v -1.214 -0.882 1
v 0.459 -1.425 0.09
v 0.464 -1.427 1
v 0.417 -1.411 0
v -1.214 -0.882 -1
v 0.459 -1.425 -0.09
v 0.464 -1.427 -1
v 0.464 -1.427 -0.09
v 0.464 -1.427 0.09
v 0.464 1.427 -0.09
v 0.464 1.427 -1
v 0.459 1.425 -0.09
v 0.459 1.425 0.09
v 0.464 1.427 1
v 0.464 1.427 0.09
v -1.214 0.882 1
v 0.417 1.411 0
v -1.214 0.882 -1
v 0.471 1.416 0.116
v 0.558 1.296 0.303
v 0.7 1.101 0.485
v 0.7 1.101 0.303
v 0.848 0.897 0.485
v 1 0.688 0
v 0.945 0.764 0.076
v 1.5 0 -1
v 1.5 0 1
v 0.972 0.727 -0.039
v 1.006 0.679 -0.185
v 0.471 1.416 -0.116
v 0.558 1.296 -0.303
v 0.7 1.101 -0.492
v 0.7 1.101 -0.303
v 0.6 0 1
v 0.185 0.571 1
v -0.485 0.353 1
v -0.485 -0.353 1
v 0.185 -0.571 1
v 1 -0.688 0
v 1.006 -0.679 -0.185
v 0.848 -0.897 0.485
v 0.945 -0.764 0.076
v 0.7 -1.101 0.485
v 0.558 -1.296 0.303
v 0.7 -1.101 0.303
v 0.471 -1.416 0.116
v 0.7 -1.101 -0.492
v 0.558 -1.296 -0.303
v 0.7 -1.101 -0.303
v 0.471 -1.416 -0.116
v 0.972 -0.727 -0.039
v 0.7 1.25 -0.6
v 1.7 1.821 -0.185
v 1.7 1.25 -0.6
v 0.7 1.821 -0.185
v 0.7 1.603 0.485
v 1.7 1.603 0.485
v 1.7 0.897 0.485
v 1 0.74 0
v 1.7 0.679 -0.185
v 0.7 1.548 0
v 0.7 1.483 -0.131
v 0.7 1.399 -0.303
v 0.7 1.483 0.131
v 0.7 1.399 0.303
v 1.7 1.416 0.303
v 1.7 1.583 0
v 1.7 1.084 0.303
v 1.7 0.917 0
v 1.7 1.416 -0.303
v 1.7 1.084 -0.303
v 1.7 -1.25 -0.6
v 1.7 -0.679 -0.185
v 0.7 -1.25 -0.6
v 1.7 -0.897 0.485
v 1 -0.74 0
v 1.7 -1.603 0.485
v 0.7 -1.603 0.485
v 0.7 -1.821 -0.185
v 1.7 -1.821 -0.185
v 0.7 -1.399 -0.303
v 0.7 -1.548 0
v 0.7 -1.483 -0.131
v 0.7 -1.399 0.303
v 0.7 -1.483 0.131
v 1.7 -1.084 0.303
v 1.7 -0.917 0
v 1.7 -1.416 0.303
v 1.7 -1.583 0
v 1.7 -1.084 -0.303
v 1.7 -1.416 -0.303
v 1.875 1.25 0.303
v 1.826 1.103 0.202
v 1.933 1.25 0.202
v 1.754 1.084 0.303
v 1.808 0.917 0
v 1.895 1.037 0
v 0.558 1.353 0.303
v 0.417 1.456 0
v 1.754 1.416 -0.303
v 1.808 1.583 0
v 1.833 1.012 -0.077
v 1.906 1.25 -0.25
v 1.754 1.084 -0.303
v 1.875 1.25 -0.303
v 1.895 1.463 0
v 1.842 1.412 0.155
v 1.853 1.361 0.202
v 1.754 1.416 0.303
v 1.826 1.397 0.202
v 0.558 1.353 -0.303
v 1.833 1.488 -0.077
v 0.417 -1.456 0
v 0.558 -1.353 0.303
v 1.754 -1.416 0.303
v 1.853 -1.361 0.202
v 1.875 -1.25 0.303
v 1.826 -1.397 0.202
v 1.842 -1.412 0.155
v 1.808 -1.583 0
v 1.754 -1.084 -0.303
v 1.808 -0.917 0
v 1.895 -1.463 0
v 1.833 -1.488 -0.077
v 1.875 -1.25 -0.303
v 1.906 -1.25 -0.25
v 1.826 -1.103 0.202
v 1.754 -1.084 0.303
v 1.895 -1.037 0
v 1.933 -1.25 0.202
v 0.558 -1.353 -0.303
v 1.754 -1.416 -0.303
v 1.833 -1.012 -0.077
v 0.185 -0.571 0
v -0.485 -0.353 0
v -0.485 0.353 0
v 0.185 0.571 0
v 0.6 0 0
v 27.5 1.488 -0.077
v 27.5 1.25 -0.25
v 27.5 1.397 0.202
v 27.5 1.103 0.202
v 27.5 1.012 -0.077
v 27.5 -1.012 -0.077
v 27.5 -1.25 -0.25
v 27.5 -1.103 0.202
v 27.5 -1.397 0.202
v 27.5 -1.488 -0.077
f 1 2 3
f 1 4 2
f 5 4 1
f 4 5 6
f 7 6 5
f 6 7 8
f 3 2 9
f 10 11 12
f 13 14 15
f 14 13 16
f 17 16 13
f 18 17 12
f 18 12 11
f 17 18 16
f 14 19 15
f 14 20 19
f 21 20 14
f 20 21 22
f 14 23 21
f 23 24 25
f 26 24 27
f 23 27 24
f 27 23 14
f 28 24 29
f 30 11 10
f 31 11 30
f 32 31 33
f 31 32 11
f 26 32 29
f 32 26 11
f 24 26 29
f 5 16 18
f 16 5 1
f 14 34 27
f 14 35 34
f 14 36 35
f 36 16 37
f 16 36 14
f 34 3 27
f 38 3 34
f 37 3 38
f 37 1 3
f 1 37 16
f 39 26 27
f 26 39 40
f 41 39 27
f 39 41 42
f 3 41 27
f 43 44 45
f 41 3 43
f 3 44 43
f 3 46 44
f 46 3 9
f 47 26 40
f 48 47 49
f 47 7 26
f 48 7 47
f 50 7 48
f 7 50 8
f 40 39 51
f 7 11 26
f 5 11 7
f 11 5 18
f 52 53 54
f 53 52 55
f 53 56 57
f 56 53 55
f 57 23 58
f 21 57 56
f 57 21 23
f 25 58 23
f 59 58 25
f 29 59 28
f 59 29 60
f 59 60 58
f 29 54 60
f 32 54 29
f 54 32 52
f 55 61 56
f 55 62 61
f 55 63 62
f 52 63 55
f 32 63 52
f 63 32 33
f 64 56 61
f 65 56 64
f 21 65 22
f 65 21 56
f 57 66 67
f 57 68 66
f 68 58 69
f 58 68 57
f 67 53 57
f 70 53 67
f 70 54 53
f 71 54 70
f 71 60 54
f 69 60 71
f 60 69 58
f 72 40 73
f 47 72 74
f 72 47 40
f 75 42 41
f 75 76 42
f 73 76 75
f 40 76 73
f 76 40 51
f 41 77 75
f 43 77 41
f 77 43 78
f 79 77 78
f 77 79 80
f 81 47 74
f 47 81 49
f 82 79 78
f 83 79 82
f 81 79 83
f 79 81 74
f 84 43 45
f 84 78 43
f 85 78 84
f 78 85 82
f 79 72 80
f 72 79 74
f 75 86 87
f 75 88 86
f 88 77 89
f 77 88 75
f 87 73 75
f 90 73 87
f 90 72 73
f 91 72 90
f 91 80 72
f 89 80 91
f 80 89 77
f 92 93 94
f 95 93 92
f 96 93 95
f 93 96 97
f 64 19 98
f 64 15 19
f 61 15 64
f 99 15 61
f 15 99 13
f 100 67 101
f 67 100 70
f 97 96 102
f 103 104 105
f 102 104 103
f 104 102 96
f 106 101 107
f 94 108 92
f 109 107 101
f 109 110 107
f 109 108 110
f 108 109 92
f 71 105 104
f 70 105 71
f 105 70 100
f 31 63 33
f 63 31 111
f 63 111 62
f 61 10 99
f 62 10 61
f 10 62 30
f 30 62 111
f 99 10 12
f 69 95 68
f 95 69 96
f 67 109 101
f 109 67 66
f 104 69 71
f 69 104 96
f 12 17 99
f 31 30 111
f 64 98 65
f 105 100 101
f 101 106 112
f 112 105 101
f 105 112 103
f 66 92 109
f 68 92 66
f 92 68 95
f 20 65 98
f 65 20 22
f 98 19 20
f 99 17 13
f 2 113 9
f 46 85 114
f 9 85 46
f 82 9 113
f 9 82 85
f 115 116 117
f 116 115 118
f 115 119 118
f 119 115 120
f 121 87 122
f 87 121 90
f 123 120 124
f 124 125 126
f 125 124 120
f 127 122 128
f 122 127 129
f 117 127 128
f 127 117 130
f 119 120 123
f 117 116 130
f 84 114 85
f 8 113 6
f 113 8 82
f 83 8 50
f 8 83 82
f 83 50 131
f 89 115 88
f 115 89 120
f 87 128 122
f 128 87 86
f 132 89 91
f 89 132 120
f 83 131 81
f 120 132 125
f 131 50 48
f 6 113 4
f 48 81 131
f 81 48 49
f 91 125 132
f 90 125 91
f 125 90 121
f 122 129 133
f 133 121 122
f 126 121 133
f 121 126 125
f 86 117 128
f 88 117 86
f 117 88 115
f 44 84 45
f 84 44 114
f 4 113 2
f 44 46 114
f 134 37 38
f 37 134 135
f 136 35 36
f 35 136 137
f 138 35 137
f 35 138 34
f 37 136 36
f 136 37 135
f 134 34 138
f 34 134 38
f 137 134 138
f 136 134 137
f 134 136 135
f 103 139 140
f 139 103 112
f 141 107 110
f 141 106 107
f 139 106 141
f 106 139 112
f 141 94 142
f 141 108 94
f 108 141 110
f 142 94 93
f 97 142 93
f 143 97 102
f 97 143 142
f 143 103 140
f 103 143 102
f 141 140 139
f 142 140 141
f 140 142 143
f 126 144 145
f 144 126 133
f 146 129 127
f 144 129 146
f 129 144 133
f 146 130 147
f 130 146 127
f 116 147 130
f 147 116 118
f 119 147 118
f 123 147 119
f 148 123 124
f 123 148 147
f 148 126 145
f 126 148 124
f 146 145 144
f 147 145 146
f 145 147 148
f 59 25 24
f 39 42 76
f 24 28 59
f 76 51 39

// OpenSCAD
// Parameters
body_dia = 3.0; //[1.5:6.0:0.1]
body_thk = 2.0; //[1.0:4.0:0.1]
lead_dia = 0.5; //[0.25:1.0:0.05]
lead_len = 25.0; //[12.0:50.0:1]
lead_pitch = 2.5; //[1.25:5.0:0.1]
neck_len = 1.0; //[0.5:2.0:0.1]
neck_dia = 1.2; //[0.6:2.4:0.1]
overlap = 0.8; //[0.3:2.0:0.1]
tinning_len = 2.0; //[1.0:5.0:0.5]
fillet_r = 0.35; //[0.15:0.8:0.05]
marking_depth = 0.2; //[0.1:0.6:0.05]
marking_dia = 1.2; //[0.6:2.4:0.1]
ref_bar_dia = 0.3; //[0.15:0.8:0.05]

// Base Shapes
module thermistor_bead_body() {
  color([0.85, 0.85, 0.8]) // Off-white for epoxy
  translate([0, 0, 0])
    cylinder(r=body_dia/2, h=body_thk, center=true);
}

module lead_exit_neck_1() {
  translate([body_dia/2 - overlap + neck_len/2, lead_pitch/2, 0])
    rotate([0, 90, 0])
      cylinder(r=neck_dia/2, h=neck_len, center=true);
}

module lead_exit_neck_2() {
  translate([body_dia/2 - overlap + neck_len/2, -lead_pitch/2, 0])
    rotate([0, 90, 0])
      cylinder(r=neck_dia/2, h=neck_len, center=true);
}

module lead_1() {
  translate([body_dia/2 - overlap + (lead_len + neck_len + overlap)/2, lead_pitch/2, 0])
    rotate([0, 90, 0])
      cylinder(r=lead_dia/2, h=lead_len + neck_len + overlap, center=true);
}

module lead_2() {
  translate([body_dia/2 - overlap + (lead_len + neck_len + overlap)/2, -lead_pitch/2, 0])
    rotate([0, 90, 0])
      cylinder(r=lead_dia/2, h=lead_len + neck_len + overlap, center=true);
}

module lead_tinning_tip_1() {
  translate([body_dia/2 - overlap + (lead_len + neck_len + overlap) - tinning_len/2, lead_pitch/2, 0])
    rotate([0, 90, 0])
      cylinder(r=lead_dia/2, h=tinning_len, center=true);
}

module lead_tinning_tip_2() {
  translate([body_dia/2 - overlap + (lead_len + neck_len + overlap) - tinning_len/2, -lead_pitch/2, 0])
    rotate([0, 90, 0])
      cylinder(r=lead_dia/2, h=tinning_len, center=true);
}

module fillet_sphere_1a() {
  translate([body_dia/2 - overlap, lead_pitch/2, 0])
    sphere(r=fillet_r, center=true);
}

module fillet_sphere_1b() {
  translate([body_dia/2 - overlap + neck_len, lead_pitch/2, 0])
    sphere(r=fillet_r, center=true);
}

module fillet_sphere_2a() {
  translate([body_dia/2 - overlap, -lead_pitch/2, 0])
    sphere(r=fillet_r, center=true);
}

module fillet_sphere_2b() {
  translate([body_dia/2 - overlap + neck_len, -lead_pitch/2, 0])
    sphere(r=fillet_r, center=true);
}

module lead_spacing_reference() {
  translate([body_dia/2 - overlap + ref_bar_dia/2, 0, 0])
    rotate([90, 0, 0])
      cylinder(r=ref_bar_dia/2, h=lead_pitch + lead_dia, center=true);
}

module body_marking() {
  translate([0, 0, body_thk/2 - (marking_depth + overlap)/2])
    cylinder(r=marking_dia/2, h=marking_depth + overlap, center=true);
}

// Operations
module small_fillet_at_lead_exit_1() {
  hull() {
    fillet_sphere_1a();
    fillet_sphere_1b();
  }
}

module small_fillet_at_lead_exit_2() {
  hull() {
    fillet_sphere_2a();
    fillet_sphere_2b();
  }
}

module epoxy_with_necks_and_fillet() {
  union() {
    thermistor_bead_body();
    lead_exit_neck_1();
    lead_exit_neck_2();
    small_fillet_at_lead_exit_1();
    small_fillet_at_lead_exit_2();
  }
}

module epoxy_with_marking() {
  difference() {
    epoxy_with_necks_and_fillet();
    body_marking();
  }
}

module leads_with_tinning() {
  union() {
    lead_1();
    lead_2();
    lead_tinning_tip_1();
    lead_tinning_tip_2();
  }
}

// Final Model
module complete_model() {
  union() {
    epoxy_with_marking();
    leads_with_tinning();
    lead_spacing_reference();
  }
}

// Render the complete model
complete_model();
